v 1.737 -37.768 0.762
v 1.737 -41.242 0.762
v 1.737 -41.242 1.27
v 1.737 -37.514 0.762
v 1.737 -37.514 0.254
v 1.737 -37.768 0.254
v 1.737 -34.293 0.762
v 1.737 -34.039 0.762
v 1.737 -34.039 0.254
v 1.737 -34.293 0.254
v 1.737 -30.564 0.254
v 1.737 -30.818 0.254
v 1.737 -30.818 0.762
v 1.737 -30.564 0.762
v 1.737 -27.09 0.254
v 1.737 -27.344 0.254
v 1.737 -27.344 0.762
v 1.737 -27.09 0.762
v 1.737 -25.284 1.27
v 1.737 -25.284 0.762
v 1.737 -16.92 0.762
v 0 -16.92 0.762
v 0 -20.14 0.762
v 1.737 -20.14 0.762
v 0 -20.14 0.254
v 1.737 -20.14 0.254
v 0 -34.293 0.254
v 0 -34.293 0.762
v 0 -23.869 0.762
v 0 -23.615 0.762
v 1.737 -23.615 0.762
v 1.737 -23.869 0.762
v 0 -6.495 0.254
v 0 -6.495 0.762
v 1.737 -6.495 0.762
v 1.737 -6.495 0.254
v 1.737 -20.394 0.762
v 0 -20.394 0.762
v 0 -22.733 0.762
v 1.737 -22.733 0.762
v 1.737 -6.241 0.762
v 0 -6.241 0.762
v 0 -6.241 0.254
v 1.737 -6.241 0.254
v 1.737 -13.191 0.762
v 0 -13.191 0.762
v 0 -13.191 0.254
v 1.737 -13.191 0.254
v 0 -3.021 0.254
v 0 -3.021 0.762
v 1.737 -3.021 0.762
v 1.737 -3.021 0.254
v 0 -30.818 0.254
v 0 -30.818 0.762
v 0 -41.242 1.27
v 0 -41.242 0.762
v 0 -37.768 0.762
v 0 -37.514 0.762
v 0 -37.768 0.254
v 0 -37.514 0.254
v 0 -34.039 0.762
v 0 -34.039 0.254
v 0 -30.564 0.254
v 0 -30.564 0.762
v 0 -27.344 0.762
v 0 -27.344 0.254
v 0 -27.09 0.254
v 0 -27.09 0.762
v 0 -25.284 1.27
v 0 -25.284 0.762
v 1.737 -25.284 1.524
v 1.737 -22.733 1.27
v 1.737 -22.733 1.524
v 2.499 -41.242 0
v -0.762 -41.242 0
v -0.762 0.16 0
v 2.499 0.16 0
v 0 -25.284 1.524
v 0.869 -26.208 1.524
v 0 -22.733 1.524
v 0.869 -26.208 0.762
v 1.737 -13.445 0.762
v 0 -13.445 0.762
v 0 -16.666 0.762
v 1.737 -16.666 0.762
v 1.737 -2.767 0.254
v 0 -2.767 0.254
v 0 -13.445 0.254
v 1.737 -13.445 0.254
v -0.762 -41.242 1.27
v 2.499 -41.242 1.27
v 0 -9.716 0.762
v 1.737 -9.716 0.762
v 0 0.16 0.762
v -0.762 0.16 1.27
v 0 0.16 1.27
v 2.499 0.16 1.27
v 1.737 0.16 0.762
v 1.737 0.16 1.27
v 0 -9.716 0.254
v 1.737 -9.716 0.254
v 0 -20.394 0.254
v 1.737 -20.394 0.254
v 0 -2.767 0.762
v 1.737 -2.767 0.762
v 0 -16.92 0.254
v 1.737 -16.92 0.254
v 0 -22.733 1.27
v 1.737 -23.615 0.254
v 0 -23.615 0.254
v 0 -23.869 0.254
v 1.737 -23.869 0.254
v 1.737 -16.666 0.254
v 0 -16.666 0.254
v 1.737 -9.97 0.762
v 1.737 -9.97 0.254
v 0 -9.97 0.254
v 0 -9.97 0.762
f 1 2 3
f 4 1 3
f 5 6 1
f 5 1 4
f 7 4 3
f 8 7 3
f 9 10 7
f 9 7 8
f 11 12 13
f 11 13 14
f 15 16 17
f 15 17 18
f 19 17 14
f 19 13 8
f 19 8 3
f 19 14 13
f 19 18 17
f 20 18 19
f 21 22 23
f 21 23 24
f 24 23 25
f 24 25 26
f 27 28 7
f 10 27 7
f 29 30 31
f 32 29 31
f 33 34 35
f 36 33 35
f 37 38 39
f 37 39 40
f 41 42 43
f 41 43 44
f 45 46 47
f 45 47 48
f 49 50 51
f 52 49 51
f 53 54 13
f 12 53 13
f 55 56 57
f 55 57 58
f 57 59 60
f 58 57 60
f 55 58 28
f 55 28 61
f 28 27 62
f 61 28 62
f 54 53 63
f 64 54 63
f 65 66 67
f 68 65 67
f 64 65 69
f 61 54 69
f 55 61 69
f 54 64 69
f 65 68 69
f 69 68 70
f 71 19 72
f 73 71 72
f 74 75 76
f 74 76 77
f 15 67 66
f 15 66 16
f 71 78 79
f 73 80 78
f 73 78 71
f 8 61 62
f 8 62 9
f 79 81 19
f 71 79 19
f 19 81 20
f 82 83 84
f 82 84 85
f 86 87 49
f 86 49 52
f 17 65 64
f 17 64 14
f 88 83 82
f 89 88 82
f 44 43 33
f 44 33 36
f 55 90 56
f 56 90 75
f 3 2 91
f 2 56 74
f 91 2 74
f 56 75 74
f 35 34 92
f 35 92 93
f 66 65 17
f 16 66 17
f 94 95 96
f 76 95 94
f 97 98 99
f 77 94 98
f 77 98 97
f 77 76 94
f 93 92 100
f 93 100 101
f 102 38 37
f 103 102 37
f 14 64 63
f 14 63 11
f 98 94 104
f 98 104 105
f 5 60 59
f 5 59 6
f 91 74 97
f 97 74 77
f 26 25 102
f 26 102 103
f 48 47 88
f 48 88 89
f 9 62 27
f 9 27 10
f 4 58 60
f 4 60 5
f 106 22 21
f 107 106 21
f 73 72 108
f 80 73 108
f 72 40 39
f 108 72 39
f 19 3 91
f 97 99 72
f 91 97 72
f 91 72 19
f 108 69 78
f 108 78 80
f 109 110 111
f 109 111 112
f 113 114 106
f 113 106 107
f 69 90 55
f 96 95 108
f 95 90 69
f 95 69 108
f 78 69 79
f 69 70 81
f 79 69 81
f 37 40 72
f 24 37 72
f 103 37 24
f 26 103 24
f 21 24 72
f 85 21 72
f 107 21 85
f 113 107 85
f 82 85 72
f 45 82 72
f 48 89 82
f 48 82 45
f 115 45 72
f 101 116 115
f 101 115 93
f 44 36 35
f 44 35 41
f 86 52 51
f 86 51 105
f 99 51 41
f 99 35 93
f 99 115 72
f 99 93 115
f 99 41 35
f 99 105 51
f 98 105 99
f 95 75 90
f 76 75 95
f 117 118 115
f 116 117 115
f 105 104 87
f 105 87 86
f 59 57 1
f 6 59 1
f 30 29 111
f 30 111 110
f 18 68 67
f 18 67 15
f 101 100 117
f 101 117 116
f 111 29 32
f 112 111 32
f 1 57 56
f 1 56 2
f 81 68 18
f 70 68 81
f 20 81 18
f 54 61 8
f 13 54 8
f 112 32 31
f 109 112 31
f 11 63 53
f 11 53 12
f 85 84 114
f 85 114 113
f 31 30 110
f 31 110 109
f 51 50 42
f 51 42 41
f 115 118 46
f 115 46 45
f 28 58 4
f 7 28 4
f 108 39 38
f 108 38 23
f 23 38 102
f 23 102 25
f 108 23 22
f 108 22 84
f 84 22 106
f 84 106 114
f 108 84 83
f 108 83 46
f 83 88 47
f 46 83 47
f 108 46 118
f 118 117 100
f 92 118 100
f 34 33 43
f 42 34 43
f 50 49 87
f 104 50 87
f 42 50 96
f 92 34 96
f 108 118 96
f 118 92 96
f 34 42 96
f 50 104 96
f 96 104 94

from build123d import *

# Parameters (mm, degrees)
F0_W     = 1.73736
F0_H     = 41.402
F1_DEPTH = 0.762
F3_DEPTH = 0.762
F4_W     = 4.572
F4_H     = 0.254
F4_W_2   = 4.571999
F5_DEPTH = 0.508
F6_W     = 0.762
F6_H     = 41.402
F7_DEPTH = 1.27


with BuildPart() as f1:
    # F0 (on Top) → F1 (new body)
    with BuildSketch(Plane.XY):
        with Locations((0.86868, -20.5415)):
            Rectangle(F0_W, F0_H)
    extrude(amount=F1_DEPTH)

    # F2 (on face) → F3 (join)
    with BuildSketch(Plane.XY.offset(0.762)):
        Polygon((0, -22.733282), (0, -25.283881), (0.86868, -26.208002), (1.73736, -25.283881), (1.73736, -22.733282), align=None)
    extrude(amount=F3_DEPTH)

    # F4 (on face) → F5 (cut)
    with BuildSketch(Plane.XY.offset(0.762)):
        with Locations((2.078398, -37.64078)):
            Rectangle(F4_W, F4_H)
        with Locations((2.066683, -34.166079)):
            Rectangle(F4_W, F4_H)
        with Locations((2.054968, -30.691379)):
            Rectangle(F4_W, F4_H)
        with Locations((2.043252, -27.216679)):
            Rectangle(F4_W_2, F4_H)
        with Locations((2.031537, -23.741979)):
            Rectangle(F4_W, F4_H)
        with Locations((2.019822, -20.267278)):
            Rectangle(F4_W, F4_H)
        with Locations((2.008107, -16.792578)):
            Rectangle(F4_W, F4_H)
        with Locations((1.996391, -13.317878)):
            Rectangle(F4_W_2, F4_H)
        with Locations((1.984676, -9.843178)):
            Rectangle(F4_W_2, F4_H)
        with Locations((1.972961, -6.368477)):
            Rectangle(F4_W, F4_H)
        with Locations((1.961246, -2.893777)):
            Rectangle(F4_W, F4_H)
    extrude(amount=-F5_DEPTH, mode=Mode.SUBTRACT)

    # F6 (on Top) → F7 (join)
    with BuildSketch(Plane.XY):
        with Locations((-0.381, -20.5415)):
            Rectangle(F6_W, F6_H)
        with Locations((2.11836, -20.5415)):
            Rectangle(F6_W, F6_H)
    extrude(amount=F7_DEPTH)


solid = f1.part
